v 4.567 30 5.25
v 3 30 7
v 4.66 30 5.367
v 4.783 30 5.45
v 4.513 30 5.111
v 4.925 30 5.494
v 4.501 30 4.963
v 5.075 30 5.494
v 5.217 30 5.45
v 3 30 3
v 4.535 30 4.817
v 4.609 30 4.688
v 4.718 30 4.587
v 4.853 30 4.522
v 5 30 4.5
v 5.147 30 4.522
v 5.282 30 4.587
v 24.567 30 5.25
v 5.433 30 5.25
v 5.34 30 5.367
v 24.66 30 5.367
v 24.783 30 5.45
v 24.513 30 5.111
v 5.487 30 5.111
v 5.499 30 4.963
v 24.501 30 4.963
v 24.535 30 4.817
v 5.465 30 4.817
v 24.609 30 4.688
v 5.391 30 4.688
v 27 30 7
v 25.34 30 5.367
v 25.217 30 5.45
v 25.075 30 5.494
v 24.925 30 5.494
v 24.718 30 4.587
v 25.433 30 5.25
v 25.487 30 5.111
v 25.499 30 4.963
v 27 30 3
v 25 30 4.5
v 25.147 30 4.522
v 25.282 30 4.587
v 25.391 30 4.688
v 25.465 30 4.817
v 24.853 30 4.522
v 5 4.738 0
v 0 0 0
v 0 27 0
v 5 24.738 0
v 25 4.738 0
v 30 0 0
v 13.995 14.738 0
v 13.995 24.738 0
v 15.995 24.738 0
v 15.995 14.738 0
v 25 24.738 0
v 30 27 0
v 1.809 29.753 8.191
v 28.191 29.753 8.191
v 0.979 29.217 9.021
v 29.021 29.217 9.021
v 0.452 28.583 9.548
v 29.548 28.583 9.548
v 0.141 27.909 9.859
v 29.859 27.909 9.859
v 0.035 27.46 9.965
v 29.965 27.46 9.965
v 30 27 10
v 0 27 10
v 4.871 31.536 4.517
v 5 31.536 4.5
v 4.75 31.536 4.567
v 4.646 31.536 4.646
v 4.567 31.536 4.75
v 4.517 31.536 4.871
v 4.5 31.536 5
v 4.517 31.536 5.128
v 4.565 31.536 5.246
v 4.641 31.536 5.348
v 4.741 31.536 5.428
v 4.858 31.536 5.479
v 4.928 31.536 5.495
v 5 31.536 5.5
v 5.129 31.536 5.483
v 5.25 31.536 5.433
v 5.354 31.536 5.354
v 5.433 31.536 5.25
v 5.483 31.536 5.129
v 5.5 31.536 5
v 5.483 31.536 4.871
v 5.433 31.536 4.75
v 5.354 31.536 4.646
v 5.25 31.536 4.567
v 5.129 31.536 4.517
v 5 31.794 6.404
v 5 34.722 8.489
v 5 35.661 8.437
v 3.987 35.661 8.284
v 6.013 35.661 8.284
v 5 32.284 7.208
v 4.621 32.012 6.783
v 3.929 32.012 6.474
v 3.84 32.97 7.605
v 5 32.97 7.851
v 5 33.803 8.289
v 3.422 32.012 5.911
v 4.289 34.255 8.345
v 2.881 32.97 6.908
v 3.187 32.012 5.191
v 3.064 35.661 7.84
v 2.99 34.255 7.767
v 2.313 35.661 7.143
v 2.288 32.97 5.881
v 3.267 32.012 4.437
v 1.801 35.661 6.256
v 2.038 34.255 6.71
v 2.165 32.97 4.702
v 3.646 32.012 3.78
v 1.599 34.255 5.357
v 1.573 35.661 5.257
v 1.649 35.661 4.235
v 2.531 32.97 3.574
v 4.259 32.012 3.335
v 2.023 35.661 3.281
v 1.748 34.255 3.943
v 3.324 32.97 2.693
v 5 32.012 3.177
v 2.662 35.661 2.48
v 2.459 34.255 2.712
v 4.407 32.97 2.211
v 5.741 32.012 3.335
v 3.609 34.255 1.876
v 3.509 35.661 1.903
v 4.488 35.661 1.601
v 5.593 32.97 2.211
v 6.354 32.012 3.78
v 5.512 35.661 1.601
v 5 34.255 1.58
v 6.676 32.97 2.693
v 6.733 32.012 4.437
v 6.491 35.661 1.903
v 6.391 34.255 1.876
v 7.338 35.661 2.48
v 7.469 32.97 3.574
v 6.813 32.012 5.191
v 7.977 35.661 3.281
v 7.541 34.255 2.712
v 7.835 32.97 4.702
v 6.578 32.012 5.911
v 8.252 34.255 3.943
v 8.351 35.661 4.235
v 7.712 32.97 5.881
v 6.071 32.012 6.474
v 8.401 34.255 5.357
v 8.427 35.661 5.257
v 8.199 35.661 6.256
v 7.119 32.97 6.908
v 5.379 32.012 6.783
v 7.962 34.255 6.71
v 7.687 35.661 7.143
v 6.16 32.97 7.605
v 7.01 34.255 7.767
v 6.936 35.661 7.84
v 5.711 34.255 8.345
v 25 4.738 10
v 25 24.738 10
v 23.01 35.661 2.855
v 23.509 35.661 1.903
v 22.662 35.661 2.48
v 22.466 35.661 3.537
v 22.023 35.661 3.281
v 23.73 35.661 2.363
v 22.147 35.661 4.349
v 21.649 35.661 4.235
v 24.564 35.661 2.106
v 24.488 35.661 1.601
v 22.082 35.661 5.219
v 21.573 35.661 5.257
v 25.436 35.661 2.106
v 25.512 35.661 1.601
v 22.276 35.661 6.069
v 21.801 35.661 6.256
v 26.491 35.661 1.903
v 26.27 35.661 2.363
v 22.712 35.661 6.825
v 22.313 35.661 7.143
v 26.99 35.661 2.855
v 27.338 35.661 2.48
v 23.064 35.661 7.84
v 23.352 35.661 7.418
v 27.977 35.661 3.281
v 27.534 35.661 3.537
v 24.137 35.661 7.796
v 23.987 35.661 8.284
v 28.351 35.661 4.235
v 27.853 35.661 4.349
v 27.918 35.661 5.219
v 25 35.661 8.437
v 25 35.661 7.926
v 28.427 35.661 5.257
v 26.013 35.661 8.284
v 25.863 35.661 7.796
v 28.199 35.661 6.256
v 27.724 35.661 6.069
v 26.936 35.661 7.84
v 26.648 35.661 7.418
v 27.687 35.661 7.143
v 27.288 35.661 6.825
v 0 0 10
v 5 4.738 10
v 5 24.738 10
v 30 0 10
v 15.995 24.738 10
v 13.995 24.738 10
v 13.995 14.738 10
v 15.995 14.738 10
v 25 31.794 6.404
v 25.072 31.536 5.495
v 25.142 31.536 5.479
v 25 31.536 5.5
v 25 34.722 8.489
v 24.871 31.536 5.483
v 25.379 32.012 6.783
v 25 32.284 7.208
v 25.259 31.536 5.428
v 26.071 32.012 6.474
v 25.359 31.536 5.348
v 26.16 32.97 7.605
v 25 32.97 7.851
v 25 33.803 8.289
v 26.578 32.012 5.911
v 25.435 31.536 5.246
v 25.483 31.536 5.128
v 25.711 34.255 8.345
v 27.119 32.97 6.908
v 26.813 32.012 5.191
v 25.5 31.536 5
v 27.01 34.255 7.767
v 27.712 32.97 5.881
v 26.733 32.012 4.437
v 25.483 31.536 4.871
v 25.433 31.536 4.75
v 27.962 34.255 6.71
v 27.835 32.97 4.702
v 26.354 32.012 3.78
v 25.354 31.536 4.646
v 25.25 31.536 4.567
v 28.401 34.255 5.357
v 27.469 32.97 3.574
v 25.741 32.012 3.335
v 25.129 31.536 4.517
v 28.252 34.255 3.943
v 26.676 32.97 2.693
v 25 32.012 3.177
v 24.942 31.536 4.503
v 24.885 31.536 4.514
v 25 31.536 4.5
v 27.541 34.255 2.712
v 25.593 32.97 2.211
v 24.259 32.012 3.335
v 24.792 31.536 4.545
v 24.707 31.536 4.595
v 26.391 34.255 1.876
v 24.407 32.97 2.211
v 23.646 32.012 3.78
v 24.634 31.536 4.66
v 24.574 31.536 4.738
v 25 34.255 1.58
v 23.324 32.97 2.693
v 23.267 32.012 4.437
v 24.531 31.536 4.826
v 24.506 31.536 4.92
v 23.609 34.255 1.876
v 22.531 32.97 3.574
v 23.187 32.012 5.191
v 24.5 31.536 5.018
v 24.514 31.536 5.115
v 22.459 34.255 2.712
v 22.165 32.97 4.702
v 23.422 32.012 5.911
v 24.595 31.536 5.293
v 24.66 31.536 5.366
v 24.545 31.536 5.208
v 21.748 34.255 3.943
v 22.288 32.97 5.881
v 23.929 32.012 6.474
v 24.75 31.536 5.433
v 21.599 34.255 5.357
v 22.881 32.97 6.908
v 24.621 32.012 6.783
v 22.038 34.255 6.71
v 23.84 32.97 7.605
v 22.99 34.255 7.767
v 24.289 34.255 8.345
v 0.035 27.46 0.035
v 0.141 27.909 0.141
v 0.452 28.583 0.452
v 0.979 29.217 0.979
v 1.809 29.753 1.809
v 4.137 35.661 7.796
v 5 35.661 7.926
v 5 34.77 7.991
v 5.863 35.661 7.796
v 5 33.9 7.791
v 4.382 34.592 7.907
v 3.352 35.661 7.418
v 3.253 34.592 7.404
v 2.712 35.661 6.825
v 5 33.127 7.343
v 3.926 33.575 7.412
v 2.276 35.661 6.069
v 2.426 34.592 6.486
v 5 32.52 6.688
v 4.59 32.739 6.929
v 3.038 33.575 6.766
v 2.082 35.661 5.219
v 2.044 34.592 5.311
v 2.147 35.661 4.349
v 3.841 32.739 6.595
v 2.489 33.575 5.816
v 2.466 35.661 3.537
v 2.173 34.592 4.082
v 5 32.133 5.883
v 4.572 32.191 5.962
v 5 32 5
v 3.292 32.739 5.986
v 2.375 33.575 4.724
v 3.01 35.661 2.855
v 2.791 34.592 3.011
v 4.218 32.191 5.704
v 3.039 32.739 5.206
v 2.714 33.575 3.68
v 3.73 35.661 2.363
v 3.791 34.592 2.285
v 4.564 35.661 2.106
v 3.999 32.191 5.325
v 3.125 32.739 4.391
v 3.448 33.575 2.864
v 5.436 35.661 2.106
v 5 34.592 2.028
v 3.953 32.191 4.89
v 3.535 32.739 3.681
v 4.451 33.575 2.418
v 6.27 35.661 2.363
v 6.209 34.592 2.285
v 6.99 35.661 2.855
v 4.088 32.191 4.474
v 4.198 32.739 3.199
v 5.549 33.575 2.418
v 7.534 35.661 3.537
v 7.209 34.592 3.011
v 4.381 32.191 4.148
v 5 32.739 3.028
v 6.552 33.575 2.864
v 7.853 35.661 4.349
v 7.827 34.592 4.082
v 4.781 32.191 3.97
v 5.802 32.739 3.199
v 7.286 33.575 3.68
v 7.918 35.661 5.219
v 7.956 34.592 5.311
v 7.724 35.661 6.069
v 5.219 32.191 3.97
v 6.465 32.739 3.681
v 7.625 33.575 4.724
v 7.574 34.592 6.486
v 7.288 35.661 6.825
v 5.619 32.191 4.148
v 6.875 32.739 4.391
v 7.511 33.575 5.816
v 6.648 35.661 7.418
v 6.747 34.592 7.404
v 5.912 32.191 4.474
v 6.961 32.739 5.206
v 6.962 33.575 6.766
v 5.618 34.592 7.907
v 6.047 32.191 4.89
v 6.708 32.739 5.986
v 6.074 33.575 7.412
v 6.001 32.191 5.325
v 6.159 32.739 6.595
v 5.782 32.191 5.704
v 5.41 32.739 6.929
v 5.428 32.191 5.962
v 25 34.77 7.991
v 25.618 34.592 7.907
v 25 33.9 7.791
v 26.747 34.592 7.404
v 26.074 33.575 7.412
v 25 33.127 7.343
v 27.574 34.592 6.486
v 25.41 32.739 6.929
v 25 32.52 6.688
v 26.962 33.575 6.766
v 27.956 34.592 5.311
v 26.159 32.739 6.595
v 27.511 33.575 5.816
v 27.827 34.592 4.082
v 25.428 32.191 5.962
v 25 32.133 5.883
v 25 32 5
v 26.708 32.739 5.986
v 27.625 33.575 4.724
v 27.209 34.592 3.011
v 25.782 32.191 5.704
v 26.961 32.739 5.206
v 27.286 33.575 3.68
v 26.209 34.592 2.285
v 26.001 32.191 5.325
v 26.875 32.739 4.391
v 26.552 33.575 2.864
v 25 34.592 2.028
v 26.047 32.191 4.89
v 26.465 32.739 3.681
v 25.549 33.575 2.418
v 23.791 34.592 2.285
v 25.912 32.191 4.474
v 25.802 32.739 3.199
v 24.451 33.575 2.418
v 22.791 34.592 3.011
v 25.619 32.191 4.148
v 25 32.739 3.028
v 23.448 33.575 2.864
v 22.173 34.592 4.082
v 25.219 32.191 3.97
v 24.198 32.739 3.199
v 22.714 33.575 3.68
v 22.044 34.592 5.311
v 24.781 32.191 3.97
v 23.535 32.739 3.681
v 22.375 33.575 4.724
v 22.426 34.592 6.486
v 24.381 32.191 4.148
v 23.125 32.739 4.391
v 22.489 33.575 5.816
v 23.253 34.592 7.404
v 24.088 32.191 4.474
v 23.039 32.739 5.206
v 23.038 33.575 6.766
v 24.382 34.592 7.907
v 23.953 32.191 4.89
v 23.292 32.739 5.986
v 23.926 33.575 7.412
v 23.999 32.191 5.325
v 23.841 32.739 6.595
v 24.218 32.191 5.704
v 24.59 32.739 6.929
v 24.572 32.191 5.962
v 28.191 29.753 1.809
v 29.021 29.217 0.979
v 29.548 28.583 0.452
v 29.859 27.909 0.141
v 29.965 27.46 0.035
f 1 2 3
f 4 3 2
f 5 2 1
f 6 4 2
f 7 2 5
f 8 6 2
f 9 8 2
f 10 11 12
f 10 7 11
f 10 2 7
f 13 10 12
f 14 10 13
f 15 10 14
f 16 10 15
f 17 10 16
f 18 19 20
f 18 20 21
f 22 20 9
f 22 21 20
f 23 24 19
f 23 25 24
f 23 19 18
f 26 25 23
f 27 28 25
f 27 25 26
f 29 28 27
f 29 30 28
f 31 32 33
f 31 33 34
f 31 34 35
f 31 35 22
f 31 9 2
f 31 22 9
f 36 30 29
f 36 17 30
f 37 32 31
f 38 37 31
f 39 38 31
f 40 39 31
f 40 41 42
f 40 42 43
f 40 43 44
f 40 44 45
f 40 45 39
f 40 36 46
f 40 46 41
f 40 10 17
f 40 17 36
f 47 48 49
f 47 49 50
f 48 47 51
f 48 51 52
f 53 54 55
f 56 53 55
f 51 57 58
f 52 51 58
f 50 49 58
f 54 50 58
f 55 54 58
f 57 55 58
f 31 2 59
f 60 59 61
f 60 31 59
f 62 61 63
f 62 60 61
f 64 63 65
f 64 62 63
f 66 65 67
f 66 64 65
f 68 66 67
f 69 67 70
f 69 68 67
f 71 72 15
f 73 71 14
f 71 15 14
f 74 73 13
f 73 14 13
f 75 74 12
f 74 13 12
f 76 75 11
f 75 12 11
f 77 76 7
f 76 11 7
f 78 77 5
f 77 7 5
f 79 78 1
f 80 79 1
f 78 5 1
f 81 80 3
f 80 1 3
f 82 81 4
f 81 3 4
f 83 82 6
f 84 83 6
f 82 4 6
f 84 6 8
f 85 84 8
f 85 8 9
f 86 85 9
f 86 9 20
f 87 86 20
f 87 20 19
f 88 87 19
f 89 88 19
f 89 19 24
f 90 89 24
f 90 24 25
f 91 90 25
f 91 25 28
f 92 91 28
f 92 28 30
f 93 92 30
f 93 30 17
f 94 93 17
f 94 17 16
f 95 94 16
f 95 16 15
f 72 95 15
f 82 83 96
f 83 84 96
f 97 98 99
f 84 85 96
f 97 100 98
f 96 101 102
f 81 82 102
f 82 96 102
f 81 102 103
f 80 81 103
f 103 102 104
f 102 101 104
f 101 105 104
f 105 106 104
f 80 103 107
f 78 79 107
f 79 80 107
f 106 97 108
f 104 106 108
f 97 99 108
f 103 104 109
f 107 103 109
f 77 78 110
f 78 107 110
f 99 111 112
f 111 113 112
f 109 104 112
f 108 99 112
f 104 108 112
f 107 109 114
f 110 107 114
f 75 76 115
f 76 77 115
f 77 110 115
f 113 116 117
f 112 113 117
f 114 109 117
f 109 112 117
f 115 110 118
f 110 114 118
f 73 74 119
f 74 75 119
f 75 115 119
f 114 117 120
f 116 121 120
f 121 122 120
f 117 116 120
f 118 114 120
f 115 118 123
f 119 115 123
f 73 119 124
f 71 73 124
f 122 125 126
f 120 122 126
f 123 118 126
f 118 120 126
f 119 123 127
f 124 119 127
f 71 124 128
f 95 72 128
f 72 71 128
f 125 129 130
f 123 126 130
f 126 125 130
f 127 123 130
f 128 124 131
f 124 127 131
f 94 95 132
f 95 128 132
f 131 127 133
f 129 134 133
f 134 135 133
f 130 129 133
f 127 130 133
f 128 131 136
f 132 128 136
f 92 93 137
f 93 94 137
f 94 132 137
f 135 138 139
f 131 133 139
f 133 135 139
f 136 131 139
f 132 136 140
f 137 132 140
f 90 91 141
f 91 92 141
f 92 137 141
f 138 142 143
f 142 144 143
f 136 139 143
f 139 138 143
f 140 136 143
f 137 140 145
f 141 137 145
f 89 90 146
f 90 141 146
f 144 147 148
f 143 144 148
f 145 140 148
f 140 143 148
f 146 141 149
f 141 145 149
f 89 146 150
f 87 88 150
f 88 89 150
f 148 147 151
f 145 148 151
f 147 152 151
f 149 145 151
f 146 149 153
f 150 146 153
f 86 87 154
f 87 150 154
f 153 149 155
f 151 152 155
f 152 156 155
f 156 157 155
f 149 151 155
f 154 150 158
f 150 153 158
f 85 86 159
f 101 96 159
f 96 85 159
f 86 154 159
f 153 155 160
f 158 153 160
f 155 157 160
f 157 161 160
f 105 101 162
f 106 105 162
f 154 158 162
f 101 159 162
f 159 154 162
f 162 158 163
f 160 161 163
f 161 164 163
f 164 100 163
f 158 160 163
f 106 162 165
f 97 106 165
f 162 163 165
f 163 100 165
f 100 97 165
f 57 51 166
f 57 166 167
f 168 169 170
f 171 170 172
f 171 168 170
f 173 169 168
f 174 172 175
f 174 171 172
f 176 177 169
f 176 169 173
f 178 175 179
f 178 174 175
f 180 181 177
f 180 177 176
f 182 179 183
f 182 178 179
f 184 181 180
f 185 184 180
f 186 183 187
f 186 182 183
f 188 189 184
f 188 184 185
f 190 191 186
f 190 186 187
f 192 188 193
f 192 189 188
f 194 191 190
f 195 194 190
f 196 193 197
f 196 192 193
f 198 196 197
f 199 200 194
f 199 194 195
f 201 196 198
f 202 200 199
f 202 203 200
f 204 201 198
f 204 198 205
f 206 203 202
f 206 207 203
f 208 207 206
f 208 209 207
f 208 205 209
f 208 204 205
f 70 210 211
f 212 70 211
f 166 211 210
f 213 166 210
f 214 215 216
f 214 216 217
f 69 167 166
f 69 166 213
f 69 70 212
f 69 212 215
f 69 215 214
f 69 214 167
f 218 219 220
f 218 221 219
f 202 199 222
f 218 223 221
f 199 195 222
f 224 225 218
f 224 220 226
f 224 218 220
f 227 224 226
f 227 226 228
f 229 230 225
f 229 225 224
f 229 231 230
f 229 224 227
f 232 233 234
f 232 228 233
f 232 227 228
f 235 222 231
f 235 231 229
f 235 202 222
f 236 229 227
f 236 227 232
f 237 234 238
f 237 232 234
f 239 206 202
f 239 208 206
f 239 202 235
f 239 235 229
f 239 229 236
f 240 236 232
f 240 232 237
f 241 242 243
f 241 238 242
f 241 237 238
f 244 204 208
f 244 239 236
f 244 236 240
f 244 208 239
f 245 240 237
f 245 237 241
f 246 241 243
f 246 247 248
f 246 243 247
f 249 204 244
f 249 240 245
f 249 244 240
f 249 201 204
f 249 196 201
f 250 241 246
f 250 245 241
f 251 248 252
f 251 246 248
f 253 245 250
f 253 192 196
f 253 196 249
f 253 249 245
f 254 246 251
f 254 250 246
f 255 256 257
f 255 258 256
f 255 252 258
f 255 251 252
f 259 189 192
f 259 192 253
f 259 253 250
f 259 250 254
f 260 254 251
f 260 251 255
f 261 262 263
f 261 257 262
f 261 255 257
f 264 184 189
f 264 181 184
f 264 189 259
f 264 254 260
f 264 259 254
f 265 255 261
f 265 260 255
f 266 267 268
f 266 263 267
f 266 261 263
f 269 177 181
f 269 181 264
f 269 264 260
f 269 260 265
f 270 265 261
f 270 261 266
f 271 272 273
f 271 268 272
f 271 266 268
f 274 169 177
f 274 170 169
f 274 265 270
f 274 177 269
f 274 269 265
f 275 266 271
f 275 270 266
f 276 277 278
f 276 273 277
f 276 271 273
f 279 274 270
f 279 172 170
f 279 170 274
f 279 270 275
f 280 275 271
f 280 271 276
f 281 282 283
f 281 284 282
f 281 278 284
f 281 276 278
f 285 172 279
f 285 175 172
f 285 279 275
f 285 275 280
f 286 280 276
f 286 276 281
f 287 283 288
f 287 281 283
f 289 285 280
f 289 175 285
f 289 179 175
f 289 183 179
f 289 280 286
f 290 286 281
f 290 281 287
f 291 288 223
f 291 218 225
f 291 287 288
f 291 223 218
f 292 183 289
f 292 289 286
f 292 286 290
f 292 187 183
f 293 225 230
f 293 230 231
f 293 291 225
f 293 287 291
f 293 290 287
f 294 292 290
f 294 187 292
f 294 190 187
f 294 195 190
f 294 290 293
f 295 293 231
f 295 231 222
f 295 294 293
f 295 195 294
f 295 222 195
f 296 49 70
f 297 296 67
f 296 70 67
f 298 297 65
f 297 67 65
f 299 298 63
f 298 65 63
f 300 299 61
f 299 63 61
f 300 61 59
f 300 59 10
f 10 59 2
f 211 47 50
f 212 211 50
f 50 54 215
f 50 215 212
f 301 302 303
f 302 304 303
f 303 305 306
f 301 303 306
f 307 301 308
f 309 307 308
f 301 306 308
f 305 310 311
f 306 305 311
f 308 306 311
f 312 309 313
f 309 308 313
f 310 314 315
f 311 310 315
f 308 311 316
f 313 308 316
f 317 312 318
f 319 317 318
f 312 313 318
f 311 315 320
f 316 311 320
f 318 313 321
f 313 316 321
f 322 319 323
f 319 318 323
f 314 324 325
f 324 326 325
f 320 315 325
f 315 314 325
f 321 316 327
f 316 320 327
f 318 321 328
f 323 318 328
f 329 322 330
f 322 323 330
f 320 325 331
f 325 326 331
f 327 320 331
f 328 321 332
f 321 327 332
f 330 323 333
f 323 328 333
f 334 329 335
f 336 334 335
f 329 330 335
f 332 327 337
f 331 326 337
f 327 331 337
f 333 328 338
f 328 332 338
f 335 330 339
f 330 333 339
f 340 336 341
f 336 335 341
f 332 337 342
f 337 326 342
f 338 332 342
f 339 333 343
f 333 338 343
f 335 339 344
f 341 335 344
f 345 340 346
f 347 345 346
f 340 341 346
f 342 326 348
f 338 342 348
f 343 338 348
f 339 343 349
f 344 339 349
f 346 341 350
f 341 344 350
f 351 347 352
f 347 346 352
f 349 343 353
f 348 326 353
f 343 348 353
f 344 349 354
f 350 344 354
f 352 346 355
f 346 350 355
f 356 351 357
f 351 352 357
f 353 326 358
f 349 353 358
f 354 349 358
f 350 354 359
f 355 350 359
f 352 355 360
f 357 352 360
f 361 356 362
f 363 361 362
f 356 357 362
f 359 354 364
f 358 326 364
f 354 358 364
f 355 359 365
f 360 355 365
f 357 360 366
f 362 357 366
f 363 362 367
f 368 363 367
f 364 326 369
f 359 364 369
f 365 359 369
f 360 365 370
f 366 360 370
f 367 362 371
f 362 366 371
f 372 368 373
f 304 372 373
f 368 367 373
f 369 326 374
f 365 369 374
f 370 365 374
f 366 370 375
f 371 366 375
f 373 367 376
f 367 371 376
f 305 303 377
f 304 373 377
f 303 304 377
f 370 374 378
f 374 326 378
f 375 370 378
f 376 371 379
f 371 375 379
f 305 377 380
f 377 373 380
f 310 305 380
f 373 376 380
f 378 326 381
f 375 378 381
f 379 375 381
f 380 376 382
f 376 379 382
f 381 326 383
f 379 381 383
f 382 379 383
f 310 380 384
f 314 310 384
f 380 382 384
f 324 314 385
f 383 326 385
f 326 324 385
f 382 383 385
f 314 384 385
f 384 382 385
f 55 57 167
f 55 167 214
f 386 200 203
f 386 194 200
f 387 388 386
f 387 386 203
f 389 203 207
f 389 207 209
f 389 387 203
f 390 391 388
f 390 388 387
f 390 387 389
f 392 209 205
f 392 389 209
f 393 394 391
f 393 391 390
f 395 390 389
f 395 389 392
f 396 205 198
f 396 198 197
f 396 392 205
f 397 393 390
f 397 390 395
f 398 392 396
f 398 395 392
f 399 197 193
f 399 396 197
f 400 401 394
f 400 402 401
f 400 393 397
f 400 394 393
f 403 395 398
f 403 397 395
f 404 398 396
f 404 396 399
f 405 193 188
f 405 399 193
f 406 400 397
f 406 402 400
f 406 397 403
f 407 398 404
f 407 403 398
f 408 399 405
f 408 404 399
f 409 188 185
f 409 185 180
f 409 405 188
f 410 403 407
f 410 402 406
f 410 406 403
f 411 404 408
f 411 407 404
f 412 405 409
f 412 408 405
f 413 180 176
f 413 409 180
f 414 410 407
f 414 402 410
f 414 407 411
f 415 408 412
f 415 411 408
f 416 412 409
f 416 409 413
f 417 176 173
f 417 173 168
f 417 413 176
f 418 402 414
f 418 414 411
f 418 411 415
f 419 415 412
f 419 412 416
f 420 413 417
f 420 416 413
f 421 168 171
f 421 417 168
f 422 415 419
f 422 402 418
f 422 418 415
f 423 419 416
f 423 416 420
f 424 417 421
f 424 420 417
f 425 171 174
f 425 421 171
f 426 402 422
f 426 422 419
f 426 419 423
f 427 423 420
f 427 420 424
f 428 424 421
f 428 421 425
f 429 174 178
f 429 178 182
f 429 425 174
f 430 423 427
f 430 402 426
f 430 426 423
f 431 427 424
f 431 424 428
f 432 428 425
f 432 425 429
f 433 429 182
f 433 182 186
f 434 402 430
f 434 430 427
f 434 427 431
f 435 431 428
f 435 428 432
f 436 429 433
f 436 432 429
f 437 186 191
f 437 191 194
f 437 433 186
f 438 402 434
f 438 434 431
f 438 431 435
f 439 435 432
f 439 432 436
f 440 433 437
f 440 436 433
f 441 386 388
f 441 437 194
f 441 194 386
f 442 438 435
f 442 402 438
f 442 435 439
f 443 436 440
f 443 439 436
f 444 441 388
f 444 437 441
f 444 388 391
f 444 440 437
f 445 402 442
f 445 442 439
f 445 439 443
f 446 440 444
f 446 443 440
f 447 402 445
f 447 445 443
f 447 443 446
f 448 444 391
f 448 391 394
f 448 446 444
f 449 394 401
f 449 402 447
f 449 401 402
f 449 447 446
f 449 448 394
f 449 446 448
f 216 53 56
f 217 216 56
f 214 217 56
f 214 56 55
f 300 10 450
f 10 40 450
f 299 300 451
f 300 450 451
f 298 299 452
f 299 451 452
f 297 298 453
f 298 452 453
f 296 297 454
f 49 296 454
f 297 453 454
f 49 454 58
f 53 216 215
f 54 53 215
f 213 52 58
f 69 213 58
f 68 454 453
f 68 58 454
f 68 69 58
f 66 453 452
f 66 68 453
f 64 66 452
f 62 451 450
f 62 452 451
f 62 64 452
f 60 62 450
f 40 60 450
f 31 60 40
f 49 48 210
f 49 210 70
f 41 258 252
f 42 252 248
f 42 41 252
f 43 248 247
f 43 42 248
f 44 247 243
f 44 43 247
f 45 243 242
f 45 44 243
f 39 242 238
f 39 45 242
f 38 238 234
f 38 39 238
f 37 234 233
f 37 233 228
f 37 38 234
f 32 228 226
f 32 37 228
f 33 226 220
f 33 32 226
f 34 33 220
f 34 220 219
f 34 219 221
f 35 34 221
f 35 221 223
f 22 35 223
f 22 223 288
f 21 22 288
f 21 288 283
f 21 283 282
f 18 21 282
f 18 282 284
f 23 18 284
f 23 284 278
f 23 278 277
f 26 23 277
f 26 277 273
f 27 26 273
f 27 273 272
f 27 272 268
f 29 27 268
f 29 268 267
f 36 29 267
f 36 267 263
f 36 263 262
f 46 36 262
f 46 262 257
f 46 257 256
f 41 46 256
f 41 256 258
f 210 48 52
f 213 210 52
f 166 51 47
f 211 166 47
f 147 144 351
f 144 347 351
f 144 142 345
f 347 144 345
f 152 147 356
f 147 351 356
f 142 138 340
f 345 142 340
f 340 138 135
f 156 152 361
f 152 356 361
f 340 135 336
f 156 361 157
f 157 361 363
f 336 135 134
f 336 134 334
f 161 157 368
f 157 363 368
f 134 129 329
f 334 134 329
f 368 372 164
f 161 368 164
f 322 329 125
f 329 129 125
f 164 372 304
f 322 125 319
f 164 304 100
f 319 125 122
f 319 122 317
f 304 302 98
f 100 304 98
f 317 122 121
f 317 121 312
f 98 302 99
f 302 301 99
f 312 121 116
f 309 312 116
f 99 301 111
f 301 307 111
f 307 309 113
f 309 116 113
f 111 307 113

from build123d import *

# Parameters (mm, degrees)
SKETCH1_W           = 30
SKETCH1_H           = 30
BOSS_EXTRUDE1_DEPTH = 10
FILLET1_R           = 3
SKETCH5_W           = 20
SKETCH5_H           = 20
CUT_EXTRUDE1_DEPTH  = 21
SKETCH6_R           = 0.5
BOSS_EXTRUDE4_DEPTH = 2
SKETCH9_W           = 2
SKETCH9_H           = 10
BOSS_EXTRUDE6_DEPTH = 10


with BuildPart() as part:
    # Sketch1 → Boss-Extrude1 (new body)
    with BuildSketch(Plane.XY):
        with Locations((15, 15)):
            Rectangle(SKETCH1_W, SKETCH1_H)
    extrude(amount=BOSS_EXTRUDE1_DEPTH)

    # Fillet1
    fillet1_edges = [part.edges().sort_by_distance(p)[0] for p in [
        (15, 30, 10),
        (15, 30, 0),
        (0, 30, 5),
        (30, 30, 5),
    ]]
    fillet(fillet1_edges, radius=FILLET1_R)

    # Sketch5 → Cut-Extrude1 (cut)
    with BuildSketch(Plane(origin=(0, 0, 0), x_dir=(-1, 0, 0), z_dir=(0, 0, -1))):
        with Locations((-15, 14.738245614)):
            Rectangle(SKETCH5_W, SKETCH5_H)
    extrude(amount=-CUT_EXTRUDE1_DEPTH, mode=Mode.SUBTRACT)

    # Sketch6 → Boss-Extrude4 (add)
    with BuildSketch(Plane(origin=(0, 30, 0), x_dir=(1, 0, 0), z_dir=(0, 1, 0))):
        with Locations(Location((5, -5, 0), (0, 0, 90))):
            Circle(SKETCH6_R)
    boss_extrude4 = extrude(amount=BOSS_EXTRUDE4_DEPTH)

    # Sketch7 → Revolve1 (revolve)
    with BuildSketch(Plane.ZY.offset(-5)):
        with BuildLine():
            Line((5, 32), (5, 31.5))
            ThreePointArc((5, 31.5), (7.698400535, 32.770956583), (8.437058256, 35.660780255))
            Line((8.437058256, 35.660780255), (7.926323539, 35.660780255))
            ThreePointArc((7.926323539, 35.660780255), (7.343324643, 33.126812979), (5, 32))
        make_face()
    revolve1 = revolve(axis=Axis((5, 32, 5), (0, -1, 0)))

    # Mirror3: Boss-Extrude4, Revolve1 across plane
    add(boss_extrude4.mirror(Plane.ZY.offset(-15)))
    add(revolve1.mirror(Plane.ZY.offset(-15)))

    # Sketch9 → Boss-Extrude6 (add)
    with BuildSketch(Plane.XY.offset(10)):
        with Locations((14.994821354, 19.738245614)):
            Rectangle(SKETCH9_W, SKETCH9_H)
    extrude(amount=-BOSS_EXTRUDE6_DEPTH)


solid = part.part
